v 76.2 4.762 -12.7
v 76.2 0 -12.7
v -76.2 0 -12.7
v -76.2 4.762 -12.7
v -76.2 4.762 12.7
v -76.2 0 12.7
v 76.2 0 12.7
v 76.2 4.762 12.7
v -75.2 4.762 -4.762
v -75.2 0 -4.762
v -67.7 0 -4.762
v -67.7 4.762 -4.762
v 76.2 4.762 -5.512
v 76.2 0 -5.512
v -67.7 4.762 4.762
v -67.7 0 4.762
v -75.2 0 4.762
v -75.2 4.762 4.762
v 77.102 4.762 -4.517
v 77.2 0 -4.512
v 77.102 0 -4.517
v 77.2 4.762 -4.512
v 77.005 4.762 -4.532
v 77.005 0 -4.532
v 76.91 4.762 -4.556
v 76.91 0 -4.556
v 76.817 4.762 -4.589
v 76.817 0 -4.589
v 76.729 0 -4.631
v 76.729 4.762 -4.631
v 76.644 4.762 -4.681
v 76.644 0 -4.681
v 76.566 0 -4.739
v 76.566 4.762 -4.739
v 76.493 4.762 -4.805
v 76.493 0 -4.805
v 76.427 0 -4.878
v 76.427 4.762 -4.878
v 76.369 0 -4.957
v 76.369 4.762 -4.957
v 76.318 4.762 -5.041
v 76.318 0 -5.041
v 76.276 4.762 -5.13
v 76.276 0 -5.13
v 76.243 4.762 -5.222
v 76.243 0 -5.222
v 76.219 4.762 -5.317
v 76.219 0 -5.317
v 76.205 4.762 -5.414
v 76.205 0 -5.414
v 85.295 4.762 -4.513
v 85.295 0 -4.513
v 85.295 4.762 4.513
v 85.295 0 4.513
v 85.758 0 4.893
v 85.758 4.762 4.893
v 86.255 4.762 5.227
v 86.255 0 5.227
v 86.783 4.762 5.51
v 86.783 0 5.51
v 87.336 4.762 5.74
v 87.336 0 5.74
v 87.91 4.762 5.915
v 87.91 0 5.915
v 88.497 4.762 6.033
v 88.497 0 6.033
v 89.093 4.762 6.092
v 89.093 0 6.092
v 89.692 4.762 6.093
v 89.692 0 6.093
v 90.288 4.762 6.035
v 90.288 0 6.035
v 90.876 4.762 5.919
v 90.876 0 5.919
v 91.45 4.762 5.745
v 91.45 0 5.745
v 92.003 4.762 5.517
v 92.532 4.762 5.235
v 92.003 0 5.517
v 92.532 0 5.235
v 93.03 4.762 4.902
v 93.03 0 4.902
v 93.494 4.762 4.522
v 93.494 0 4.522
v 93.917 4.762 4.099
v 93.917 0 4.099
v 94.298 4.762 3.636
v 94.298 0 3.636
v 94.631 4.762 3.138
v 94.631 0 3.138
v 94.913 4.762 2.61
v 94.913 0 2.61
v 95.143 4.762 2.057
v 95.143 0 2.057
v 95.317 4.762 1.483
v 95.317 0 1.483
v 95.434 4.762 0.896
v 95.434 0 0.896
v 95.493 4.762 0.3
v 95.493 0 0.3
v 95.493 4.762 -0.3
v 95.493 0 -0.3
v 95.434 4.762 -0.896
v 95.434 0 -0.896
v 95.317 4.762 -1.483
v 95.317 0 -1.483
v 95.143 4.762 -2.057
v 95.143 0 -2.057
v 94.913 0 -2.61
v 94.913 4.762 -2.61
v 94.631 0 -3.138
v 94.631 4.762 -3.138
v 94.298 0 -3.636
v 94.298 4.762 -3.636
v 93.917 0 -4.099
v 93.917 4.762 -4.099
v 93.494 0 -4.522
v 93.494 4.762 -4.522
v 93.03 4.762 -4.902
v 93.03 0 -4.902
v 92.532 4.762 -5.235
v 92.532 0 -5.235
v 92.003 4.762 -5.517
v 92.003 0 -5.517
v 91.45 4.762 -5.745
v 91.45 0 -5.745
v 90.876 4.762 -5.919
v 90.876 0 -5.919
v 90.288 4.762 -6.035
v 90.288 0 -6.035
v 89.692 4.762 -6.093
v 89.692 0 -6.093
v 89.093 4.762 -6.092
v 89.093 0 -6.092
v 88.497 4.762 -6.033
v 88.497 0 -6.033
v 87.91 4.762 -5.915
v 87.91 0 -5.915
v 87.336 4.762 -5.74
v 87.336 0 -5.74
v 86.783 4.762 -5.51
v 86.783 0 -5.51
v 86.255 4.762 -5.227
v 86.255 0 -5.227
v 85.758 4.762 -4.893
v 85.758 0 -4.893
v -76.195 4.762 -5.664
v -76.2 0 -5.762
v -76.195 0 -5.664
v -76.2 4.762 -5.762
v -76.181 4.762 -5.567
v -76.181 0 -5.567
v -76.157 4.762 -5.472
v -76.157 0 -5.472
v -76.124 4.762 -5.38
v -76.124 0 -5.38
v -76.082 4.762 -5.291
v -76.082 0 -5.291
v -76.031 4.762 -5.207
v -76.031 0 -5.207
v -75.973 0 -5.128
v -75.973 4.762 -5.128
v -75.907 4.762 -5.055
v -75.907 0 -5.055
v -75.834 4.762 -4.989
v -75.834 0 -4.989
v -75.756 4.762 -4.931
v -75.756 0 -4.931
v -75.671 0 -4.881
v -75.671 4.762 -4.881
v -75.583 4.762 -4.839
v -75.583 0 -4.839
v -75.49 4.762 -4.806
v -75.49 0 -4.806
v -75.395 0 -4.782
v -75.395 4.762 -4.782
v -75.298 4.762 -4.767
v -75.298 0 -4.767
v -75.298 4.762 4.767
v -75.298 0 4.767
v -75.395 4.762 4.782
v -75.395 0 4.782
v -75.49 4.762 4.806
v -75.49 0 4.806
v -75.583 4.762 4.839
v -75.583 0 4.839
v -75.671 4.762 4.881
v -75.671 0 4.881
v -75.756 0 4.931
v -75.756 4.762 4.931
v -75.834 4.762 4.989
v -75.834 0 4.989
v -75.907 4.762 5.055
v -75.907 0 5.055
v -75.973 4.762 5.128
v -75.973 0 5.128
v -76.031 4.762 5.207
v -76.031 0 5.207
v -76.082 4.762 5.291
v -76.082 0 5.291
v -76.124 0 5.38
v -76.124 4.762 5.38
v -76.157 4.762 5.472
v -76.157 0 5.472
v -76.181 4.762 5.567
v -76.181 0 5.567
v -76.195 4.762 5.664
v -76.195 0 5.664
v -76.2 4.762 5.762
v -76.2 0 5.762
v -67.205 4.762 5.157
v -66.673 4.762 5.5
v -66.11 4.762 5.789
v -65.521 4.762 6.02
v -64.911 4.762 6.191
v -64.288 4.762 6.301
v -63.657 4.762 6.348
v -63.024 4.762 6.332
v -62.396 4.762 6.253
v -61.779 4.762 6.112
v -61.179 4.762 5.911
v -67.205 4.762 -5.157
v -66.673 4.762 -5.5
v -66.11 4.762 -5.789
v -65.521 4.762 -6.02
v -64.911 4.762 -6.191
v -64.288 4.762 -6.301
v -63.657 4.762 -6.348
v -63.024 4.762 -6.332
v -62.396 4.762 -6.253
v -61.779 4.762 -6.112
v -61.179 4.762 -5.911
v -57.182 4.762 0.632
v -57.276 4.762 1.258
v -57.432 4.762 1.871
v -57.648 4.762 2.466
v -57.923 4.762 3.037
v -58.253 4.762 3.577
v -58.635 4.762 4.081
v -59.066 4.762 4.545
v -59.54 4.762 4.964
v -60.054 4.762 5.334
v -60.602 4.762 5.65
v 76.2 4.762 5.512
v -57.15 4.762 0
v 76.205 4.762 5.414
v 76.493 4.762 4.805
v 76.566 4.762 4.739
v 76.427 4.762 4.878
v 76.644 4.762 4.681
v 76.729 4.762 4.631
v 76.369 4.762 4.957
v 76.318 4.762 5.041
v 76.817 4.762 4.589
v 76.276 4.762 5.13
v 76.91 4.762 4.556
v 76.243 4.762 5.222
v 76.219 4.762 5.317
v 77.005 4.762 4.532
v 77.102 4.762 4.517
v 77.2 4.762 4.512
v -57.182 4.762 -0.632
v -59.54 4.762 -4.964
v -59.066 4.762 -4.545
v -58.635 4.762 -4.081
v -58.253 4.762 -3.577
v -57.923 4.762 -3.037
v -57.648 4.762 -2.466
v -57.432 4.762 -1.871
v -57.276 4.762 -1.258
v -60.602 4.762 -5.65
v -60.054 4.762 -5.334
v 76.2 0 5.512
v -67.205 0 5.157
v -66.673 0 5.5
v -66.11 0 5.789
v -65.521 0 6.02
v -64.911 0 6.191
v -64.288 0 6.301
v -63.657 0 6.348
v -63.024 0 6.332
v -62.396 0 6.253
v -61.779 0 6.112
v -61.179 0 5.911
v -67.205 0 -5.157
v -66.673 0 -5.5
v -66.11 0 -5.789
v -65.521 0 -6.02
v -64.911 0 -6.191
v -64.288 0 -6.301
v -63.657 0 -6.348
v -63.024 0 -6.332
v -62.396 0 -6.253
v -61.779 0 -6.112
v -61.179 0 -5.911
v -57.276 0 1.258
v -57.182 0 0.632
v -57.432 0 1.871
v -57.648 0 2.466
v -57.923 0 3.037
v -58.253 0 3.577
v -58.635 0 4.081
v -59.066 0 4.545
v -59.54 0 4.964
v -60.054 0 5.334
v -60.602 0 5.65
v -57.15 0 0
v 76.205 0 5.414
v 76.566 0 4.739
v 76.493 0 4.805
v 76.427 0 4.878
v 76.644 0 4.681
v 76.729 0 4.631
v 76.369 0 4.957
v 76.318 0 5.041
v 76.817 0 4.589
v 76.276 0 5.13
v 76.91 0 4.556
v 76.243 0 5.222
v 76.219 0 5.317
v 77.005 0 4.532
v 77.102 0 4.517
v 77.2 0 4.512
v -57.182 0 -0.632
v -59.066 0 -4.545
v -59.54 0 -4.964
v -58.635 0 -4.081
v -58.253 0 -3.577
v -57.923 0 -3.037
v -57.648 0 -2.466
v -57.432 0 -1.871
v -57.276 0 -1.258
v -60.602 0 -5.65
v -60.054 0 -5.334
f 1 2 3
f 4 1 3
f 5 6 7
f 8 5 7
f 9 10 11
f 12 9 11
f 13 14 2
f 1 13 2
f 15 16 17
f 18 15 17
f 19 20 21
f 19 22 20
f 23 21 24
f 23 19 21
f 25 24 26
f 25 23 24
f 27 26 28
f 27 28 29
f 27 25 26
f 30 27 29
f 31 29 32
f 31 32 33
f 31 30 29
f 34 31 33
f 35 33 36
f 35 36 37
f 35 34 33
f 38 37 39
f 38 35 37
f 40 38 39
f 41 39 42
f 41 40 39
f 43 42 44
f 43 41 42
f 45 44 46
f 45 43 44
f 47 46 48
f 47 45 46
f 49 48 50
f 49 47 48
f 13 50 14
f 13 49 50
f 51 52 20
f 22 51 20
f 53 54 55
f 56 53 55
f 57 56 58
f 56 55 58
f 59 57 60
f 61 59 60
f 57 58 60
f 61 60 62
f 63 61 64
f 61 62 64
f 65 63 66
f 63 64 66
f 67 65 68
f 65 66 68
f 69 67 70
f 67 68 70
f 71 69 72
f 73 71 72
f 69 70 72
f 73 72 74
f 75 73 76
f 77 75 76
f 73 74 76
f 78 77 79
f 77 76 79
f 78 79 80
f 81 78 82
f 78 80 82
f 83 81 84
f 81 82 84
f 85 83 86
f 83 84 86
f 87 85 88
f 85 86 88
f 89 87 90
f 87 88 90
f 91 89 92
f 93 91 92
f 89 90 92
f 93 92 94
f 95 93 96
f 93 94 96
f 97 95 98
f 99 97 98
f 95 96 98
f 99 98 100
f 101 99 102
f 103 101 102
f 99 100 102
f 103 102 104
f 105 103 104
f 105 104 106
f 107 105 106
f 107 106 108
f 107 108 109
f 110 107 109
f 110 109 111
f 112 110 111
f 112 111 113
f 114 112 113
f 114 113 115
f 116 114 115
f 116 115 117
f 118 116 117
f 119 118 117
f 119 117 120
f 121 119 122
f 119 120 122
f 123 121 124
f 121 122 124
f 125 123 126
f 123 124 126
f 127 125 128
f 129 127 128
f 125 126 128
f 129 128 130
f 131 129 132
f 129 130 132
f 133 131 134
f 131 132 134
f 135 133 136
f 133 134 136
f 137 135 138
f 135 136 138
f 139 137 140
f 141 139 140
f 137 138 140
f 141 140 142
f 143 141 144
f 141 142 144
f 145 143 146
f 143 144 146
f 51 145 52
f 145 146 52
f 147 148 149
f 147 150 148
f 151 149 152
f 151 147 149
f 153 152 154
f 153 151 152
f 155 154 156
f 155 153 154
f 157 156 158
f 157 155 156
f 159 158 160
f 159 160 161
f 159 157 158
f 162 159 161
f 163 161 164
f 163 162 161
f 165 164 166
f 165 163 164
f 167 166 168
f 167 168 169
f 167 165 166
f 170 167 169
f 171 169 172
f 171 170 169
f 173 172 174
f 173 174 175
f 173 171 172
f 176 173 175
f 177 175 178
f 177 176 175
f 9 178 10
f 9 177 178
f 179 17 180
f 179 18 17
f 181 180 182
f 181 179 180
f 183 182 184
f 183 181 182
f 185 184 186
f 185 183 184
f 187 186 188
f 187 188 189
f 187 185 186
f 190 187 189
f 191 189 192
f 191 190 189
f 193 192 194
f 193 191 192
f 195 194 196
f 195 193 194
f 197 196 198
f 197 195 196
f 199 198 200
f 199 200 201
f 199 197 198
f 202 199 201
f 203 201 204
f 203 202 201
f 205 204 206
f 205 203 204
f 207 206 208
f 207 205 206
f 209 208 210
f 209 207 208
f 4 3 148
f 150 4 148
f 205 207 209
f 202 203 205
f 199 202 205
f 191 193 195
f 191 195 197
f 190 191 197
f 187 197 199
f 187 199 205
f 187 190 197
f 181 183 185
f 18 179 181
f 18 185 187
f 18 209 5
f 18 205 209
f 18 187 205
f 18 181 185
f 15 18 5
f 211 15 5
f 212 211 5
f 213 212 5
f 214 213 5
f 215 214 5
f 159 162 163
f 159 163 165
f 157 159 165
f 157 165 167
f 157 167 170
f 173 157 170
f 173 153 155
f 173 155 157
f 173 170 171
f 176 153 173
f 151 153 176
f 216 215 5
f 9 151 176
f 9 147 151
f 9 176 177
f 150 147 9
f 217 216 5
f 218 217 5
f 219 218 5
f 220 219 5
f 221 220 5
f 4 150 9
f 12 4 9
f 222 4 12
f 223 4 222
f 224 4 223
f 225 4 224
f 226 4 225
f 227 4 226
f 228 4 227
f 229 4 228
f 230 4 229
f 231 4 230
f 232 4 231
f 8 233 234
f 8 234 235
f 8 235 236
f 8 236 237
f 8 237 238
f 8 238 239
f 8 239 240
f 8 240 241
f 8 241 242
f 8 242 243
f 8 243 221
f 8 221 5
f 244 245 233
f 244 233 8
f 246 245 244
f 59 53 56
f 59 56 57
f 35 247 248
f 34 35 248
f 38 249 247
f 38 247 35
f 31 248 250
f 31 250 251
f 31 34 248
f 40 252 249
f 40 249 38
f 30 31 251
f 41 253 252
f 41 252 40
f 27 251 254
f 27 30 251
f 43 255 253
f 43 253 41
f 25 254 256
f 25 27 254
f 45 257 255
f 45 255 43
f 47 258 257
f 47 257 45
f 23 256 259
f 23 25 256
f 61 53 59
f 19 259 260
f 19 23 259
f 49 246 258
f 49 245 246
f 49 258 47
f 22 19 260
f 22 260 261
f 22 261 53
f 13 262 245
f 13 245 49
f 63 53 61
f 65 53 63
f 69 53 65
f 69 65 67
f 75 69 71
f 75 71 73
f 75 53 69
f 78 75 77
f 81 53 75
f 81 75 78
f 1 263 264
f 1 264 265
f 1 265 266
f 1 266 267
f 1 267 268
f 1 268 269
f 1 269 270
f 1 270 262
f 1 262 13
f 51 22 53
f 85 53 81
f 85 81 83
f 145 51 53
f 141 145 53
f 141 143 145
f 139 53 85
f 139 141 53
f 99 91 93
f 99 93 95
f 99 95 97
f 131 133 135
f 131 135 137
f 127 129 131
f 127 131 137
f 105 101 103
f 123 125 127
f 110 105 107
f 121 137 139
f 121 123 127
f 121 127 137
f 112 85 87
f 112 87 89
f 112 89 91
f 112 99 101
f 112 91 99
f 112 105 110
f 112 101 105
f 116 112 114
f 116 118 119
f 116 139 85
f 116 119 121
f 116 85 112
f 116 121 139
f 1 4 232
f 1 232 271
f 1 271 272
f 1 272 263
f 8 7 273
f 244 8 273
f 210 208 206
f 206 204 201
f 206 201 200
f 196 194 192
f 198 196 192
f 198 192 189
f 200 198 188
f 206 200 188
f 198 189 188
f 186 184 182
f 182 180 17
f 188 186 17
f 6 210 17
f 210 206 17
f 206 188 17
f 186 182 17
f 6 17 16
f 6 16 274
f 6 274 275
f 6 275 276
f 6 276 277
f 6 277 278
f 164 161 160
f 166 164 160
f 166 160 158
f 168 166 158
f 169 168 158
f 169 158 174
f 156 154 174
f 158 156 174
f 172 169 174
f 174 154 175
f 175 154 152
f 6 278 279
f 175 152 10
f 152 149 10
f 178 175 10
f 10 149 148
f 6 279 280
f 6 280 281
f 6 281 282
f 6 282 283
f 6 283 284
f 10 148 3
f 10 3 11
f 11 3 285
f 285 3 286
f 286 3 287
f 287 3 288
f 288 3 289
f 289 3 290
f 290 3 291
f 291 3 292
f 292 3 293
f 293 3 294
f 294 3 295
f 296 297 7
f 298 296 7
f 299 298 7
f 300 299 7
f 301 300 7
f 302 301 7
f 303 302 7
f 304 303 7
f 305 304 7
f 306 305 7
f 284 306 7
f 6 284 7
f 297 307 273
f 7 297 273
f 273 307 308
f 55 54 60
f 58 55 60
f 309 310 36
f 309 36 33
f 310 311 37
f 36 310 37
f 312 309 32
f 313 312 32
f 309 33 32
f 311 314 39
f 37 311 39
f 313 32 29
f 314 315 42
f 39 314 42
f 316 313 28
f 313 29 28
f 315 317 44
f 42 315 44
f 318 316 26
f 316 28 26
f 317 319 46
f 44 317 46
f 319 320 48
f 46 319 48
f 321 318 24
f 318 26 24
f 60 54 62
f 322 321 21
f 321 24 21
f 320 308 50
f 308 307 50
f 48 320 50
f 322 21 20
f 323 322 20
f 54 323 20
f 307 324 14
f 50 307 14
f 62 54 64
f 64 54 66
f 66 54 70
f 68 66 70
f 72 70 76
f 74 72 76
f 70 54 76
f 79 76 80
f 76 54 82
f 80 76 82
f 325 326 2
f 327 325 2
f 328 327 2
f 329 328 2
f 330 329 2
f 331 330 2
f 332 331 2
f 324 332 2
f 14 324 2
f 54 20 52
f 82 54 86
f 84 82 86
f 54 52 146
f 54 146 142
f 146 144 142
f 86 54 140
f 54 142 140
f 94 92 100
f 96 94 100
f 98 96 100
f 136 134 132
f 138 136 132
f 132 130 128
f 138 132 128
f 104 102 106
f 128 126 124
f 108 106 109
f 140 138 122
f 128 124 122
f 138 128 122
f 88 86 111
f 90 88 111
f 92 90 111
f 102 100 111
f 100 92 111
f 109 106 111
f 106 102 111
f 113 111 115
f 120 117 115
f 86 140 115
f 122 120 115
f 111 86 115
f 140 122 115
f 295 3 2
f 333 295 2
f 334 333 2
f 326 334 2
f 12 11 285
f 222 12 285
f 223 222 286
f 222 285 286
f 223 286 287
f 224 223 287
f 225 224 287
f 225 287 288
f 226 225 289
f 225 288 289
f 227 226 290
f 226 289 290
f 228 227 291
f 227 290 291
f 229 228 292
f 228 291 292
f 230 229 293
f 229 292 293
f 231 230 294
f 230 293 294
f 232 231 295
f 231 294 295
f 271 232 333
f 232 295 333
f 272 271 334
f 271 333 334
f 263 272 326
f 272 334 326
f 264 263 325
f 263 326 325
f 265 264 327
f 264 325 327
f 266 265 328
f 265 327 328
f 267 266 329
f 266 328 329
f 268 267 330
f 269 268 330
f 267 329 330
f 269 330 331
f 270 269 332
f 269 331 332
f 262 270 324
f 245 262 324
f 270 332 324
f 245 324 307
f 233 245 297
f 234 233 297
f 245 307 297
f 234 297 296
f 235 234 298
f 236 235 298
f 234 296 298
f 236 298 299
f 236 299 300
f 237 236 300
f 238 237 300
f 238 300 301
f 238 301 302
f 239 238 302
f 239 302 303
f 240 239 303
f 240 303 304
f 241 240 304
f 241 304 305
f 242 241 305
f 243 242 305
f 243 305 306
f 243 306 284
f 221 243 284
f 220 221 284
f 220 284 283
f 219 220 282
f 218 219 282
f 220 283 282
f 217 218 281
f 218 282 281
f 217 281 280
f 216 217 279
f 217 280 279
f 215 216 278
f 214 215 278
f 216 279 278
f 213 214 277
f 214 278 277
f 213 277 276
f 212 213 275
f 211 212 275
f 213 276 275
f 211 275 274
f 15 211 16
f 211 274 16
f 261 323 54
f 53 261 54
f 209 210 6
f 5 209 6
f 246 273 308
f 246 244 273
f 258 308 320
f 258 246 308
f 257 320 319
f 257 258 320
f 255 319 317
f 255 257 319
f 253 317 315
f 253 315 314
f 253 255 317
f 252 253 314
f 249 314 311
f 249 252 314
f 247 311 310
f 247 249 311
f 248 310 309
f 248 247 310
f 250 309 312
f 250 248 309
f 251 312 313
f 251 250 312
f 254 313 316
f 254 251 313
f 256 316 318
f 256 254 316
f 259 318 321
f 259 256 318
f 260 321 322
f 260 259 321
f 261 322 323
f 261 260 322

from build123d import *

# Parameters (mm, degrees)
BOSS_EXTRUDE1_DEPTH = 4.7625
FILLET1_R           = 1


with BuildPart() as part:
    # Sketch1 → Boss-Extrude1 (new body)
    with BuildSketch(Plane(origin=(0, 0, 0), x_dir=(1, 0, 0), z_dir=(0, 1, 0))):
        with BuildLine():
            Line((-76.2, -12.7), (76.2, -12.7))
            Line((76.2, -12.7), (76.2, -4.5125))
            Line((76.2, -4.5125), (85.295448411, -4.5125))
            ThreePointArc((85.295448411, -4.5125), (95.5, 0), (85.295448411, 4.5125))
            Line((85.295448411, 4.5125), (76.2, 4.5125))
            Line((76.2, 4.5125), (76.2, 12.7))
            Line((76.2, 12.7), (-76.2, 12.7))
            Line((-76.2, 12.7), (-76.2, 4.7625))
            Line((-76.2, 4.7625), (-67.700130206, 4.7625))
            ThreePointArc((-67.700130206, 4.7625), (-57.15, 0), (-67.700130206, -4.7625))
            Line((-67.700130206, -4.7625), (-76.2, -4.7625))
            Line((-76.2, -4.7625), (-76.2, -12.7))
        make_face()
    extrude(amount=BOSS_EXTRUDE1_DEPTH)

    # Fillet1
    fillet1_edges = [part.edges().sort_by_distance(p)[0] for p in [
        (76.2, 2.38125, -4.5125),
        (76.2, 2.38125, 4.5125),
        (-76.2, 2.38125, 4.7625),
        (-76.2, 2.38125, -4.7625),
    ]]
    fillet(fillet1_edges, radius=FILLET1_R)


solid = part.part
